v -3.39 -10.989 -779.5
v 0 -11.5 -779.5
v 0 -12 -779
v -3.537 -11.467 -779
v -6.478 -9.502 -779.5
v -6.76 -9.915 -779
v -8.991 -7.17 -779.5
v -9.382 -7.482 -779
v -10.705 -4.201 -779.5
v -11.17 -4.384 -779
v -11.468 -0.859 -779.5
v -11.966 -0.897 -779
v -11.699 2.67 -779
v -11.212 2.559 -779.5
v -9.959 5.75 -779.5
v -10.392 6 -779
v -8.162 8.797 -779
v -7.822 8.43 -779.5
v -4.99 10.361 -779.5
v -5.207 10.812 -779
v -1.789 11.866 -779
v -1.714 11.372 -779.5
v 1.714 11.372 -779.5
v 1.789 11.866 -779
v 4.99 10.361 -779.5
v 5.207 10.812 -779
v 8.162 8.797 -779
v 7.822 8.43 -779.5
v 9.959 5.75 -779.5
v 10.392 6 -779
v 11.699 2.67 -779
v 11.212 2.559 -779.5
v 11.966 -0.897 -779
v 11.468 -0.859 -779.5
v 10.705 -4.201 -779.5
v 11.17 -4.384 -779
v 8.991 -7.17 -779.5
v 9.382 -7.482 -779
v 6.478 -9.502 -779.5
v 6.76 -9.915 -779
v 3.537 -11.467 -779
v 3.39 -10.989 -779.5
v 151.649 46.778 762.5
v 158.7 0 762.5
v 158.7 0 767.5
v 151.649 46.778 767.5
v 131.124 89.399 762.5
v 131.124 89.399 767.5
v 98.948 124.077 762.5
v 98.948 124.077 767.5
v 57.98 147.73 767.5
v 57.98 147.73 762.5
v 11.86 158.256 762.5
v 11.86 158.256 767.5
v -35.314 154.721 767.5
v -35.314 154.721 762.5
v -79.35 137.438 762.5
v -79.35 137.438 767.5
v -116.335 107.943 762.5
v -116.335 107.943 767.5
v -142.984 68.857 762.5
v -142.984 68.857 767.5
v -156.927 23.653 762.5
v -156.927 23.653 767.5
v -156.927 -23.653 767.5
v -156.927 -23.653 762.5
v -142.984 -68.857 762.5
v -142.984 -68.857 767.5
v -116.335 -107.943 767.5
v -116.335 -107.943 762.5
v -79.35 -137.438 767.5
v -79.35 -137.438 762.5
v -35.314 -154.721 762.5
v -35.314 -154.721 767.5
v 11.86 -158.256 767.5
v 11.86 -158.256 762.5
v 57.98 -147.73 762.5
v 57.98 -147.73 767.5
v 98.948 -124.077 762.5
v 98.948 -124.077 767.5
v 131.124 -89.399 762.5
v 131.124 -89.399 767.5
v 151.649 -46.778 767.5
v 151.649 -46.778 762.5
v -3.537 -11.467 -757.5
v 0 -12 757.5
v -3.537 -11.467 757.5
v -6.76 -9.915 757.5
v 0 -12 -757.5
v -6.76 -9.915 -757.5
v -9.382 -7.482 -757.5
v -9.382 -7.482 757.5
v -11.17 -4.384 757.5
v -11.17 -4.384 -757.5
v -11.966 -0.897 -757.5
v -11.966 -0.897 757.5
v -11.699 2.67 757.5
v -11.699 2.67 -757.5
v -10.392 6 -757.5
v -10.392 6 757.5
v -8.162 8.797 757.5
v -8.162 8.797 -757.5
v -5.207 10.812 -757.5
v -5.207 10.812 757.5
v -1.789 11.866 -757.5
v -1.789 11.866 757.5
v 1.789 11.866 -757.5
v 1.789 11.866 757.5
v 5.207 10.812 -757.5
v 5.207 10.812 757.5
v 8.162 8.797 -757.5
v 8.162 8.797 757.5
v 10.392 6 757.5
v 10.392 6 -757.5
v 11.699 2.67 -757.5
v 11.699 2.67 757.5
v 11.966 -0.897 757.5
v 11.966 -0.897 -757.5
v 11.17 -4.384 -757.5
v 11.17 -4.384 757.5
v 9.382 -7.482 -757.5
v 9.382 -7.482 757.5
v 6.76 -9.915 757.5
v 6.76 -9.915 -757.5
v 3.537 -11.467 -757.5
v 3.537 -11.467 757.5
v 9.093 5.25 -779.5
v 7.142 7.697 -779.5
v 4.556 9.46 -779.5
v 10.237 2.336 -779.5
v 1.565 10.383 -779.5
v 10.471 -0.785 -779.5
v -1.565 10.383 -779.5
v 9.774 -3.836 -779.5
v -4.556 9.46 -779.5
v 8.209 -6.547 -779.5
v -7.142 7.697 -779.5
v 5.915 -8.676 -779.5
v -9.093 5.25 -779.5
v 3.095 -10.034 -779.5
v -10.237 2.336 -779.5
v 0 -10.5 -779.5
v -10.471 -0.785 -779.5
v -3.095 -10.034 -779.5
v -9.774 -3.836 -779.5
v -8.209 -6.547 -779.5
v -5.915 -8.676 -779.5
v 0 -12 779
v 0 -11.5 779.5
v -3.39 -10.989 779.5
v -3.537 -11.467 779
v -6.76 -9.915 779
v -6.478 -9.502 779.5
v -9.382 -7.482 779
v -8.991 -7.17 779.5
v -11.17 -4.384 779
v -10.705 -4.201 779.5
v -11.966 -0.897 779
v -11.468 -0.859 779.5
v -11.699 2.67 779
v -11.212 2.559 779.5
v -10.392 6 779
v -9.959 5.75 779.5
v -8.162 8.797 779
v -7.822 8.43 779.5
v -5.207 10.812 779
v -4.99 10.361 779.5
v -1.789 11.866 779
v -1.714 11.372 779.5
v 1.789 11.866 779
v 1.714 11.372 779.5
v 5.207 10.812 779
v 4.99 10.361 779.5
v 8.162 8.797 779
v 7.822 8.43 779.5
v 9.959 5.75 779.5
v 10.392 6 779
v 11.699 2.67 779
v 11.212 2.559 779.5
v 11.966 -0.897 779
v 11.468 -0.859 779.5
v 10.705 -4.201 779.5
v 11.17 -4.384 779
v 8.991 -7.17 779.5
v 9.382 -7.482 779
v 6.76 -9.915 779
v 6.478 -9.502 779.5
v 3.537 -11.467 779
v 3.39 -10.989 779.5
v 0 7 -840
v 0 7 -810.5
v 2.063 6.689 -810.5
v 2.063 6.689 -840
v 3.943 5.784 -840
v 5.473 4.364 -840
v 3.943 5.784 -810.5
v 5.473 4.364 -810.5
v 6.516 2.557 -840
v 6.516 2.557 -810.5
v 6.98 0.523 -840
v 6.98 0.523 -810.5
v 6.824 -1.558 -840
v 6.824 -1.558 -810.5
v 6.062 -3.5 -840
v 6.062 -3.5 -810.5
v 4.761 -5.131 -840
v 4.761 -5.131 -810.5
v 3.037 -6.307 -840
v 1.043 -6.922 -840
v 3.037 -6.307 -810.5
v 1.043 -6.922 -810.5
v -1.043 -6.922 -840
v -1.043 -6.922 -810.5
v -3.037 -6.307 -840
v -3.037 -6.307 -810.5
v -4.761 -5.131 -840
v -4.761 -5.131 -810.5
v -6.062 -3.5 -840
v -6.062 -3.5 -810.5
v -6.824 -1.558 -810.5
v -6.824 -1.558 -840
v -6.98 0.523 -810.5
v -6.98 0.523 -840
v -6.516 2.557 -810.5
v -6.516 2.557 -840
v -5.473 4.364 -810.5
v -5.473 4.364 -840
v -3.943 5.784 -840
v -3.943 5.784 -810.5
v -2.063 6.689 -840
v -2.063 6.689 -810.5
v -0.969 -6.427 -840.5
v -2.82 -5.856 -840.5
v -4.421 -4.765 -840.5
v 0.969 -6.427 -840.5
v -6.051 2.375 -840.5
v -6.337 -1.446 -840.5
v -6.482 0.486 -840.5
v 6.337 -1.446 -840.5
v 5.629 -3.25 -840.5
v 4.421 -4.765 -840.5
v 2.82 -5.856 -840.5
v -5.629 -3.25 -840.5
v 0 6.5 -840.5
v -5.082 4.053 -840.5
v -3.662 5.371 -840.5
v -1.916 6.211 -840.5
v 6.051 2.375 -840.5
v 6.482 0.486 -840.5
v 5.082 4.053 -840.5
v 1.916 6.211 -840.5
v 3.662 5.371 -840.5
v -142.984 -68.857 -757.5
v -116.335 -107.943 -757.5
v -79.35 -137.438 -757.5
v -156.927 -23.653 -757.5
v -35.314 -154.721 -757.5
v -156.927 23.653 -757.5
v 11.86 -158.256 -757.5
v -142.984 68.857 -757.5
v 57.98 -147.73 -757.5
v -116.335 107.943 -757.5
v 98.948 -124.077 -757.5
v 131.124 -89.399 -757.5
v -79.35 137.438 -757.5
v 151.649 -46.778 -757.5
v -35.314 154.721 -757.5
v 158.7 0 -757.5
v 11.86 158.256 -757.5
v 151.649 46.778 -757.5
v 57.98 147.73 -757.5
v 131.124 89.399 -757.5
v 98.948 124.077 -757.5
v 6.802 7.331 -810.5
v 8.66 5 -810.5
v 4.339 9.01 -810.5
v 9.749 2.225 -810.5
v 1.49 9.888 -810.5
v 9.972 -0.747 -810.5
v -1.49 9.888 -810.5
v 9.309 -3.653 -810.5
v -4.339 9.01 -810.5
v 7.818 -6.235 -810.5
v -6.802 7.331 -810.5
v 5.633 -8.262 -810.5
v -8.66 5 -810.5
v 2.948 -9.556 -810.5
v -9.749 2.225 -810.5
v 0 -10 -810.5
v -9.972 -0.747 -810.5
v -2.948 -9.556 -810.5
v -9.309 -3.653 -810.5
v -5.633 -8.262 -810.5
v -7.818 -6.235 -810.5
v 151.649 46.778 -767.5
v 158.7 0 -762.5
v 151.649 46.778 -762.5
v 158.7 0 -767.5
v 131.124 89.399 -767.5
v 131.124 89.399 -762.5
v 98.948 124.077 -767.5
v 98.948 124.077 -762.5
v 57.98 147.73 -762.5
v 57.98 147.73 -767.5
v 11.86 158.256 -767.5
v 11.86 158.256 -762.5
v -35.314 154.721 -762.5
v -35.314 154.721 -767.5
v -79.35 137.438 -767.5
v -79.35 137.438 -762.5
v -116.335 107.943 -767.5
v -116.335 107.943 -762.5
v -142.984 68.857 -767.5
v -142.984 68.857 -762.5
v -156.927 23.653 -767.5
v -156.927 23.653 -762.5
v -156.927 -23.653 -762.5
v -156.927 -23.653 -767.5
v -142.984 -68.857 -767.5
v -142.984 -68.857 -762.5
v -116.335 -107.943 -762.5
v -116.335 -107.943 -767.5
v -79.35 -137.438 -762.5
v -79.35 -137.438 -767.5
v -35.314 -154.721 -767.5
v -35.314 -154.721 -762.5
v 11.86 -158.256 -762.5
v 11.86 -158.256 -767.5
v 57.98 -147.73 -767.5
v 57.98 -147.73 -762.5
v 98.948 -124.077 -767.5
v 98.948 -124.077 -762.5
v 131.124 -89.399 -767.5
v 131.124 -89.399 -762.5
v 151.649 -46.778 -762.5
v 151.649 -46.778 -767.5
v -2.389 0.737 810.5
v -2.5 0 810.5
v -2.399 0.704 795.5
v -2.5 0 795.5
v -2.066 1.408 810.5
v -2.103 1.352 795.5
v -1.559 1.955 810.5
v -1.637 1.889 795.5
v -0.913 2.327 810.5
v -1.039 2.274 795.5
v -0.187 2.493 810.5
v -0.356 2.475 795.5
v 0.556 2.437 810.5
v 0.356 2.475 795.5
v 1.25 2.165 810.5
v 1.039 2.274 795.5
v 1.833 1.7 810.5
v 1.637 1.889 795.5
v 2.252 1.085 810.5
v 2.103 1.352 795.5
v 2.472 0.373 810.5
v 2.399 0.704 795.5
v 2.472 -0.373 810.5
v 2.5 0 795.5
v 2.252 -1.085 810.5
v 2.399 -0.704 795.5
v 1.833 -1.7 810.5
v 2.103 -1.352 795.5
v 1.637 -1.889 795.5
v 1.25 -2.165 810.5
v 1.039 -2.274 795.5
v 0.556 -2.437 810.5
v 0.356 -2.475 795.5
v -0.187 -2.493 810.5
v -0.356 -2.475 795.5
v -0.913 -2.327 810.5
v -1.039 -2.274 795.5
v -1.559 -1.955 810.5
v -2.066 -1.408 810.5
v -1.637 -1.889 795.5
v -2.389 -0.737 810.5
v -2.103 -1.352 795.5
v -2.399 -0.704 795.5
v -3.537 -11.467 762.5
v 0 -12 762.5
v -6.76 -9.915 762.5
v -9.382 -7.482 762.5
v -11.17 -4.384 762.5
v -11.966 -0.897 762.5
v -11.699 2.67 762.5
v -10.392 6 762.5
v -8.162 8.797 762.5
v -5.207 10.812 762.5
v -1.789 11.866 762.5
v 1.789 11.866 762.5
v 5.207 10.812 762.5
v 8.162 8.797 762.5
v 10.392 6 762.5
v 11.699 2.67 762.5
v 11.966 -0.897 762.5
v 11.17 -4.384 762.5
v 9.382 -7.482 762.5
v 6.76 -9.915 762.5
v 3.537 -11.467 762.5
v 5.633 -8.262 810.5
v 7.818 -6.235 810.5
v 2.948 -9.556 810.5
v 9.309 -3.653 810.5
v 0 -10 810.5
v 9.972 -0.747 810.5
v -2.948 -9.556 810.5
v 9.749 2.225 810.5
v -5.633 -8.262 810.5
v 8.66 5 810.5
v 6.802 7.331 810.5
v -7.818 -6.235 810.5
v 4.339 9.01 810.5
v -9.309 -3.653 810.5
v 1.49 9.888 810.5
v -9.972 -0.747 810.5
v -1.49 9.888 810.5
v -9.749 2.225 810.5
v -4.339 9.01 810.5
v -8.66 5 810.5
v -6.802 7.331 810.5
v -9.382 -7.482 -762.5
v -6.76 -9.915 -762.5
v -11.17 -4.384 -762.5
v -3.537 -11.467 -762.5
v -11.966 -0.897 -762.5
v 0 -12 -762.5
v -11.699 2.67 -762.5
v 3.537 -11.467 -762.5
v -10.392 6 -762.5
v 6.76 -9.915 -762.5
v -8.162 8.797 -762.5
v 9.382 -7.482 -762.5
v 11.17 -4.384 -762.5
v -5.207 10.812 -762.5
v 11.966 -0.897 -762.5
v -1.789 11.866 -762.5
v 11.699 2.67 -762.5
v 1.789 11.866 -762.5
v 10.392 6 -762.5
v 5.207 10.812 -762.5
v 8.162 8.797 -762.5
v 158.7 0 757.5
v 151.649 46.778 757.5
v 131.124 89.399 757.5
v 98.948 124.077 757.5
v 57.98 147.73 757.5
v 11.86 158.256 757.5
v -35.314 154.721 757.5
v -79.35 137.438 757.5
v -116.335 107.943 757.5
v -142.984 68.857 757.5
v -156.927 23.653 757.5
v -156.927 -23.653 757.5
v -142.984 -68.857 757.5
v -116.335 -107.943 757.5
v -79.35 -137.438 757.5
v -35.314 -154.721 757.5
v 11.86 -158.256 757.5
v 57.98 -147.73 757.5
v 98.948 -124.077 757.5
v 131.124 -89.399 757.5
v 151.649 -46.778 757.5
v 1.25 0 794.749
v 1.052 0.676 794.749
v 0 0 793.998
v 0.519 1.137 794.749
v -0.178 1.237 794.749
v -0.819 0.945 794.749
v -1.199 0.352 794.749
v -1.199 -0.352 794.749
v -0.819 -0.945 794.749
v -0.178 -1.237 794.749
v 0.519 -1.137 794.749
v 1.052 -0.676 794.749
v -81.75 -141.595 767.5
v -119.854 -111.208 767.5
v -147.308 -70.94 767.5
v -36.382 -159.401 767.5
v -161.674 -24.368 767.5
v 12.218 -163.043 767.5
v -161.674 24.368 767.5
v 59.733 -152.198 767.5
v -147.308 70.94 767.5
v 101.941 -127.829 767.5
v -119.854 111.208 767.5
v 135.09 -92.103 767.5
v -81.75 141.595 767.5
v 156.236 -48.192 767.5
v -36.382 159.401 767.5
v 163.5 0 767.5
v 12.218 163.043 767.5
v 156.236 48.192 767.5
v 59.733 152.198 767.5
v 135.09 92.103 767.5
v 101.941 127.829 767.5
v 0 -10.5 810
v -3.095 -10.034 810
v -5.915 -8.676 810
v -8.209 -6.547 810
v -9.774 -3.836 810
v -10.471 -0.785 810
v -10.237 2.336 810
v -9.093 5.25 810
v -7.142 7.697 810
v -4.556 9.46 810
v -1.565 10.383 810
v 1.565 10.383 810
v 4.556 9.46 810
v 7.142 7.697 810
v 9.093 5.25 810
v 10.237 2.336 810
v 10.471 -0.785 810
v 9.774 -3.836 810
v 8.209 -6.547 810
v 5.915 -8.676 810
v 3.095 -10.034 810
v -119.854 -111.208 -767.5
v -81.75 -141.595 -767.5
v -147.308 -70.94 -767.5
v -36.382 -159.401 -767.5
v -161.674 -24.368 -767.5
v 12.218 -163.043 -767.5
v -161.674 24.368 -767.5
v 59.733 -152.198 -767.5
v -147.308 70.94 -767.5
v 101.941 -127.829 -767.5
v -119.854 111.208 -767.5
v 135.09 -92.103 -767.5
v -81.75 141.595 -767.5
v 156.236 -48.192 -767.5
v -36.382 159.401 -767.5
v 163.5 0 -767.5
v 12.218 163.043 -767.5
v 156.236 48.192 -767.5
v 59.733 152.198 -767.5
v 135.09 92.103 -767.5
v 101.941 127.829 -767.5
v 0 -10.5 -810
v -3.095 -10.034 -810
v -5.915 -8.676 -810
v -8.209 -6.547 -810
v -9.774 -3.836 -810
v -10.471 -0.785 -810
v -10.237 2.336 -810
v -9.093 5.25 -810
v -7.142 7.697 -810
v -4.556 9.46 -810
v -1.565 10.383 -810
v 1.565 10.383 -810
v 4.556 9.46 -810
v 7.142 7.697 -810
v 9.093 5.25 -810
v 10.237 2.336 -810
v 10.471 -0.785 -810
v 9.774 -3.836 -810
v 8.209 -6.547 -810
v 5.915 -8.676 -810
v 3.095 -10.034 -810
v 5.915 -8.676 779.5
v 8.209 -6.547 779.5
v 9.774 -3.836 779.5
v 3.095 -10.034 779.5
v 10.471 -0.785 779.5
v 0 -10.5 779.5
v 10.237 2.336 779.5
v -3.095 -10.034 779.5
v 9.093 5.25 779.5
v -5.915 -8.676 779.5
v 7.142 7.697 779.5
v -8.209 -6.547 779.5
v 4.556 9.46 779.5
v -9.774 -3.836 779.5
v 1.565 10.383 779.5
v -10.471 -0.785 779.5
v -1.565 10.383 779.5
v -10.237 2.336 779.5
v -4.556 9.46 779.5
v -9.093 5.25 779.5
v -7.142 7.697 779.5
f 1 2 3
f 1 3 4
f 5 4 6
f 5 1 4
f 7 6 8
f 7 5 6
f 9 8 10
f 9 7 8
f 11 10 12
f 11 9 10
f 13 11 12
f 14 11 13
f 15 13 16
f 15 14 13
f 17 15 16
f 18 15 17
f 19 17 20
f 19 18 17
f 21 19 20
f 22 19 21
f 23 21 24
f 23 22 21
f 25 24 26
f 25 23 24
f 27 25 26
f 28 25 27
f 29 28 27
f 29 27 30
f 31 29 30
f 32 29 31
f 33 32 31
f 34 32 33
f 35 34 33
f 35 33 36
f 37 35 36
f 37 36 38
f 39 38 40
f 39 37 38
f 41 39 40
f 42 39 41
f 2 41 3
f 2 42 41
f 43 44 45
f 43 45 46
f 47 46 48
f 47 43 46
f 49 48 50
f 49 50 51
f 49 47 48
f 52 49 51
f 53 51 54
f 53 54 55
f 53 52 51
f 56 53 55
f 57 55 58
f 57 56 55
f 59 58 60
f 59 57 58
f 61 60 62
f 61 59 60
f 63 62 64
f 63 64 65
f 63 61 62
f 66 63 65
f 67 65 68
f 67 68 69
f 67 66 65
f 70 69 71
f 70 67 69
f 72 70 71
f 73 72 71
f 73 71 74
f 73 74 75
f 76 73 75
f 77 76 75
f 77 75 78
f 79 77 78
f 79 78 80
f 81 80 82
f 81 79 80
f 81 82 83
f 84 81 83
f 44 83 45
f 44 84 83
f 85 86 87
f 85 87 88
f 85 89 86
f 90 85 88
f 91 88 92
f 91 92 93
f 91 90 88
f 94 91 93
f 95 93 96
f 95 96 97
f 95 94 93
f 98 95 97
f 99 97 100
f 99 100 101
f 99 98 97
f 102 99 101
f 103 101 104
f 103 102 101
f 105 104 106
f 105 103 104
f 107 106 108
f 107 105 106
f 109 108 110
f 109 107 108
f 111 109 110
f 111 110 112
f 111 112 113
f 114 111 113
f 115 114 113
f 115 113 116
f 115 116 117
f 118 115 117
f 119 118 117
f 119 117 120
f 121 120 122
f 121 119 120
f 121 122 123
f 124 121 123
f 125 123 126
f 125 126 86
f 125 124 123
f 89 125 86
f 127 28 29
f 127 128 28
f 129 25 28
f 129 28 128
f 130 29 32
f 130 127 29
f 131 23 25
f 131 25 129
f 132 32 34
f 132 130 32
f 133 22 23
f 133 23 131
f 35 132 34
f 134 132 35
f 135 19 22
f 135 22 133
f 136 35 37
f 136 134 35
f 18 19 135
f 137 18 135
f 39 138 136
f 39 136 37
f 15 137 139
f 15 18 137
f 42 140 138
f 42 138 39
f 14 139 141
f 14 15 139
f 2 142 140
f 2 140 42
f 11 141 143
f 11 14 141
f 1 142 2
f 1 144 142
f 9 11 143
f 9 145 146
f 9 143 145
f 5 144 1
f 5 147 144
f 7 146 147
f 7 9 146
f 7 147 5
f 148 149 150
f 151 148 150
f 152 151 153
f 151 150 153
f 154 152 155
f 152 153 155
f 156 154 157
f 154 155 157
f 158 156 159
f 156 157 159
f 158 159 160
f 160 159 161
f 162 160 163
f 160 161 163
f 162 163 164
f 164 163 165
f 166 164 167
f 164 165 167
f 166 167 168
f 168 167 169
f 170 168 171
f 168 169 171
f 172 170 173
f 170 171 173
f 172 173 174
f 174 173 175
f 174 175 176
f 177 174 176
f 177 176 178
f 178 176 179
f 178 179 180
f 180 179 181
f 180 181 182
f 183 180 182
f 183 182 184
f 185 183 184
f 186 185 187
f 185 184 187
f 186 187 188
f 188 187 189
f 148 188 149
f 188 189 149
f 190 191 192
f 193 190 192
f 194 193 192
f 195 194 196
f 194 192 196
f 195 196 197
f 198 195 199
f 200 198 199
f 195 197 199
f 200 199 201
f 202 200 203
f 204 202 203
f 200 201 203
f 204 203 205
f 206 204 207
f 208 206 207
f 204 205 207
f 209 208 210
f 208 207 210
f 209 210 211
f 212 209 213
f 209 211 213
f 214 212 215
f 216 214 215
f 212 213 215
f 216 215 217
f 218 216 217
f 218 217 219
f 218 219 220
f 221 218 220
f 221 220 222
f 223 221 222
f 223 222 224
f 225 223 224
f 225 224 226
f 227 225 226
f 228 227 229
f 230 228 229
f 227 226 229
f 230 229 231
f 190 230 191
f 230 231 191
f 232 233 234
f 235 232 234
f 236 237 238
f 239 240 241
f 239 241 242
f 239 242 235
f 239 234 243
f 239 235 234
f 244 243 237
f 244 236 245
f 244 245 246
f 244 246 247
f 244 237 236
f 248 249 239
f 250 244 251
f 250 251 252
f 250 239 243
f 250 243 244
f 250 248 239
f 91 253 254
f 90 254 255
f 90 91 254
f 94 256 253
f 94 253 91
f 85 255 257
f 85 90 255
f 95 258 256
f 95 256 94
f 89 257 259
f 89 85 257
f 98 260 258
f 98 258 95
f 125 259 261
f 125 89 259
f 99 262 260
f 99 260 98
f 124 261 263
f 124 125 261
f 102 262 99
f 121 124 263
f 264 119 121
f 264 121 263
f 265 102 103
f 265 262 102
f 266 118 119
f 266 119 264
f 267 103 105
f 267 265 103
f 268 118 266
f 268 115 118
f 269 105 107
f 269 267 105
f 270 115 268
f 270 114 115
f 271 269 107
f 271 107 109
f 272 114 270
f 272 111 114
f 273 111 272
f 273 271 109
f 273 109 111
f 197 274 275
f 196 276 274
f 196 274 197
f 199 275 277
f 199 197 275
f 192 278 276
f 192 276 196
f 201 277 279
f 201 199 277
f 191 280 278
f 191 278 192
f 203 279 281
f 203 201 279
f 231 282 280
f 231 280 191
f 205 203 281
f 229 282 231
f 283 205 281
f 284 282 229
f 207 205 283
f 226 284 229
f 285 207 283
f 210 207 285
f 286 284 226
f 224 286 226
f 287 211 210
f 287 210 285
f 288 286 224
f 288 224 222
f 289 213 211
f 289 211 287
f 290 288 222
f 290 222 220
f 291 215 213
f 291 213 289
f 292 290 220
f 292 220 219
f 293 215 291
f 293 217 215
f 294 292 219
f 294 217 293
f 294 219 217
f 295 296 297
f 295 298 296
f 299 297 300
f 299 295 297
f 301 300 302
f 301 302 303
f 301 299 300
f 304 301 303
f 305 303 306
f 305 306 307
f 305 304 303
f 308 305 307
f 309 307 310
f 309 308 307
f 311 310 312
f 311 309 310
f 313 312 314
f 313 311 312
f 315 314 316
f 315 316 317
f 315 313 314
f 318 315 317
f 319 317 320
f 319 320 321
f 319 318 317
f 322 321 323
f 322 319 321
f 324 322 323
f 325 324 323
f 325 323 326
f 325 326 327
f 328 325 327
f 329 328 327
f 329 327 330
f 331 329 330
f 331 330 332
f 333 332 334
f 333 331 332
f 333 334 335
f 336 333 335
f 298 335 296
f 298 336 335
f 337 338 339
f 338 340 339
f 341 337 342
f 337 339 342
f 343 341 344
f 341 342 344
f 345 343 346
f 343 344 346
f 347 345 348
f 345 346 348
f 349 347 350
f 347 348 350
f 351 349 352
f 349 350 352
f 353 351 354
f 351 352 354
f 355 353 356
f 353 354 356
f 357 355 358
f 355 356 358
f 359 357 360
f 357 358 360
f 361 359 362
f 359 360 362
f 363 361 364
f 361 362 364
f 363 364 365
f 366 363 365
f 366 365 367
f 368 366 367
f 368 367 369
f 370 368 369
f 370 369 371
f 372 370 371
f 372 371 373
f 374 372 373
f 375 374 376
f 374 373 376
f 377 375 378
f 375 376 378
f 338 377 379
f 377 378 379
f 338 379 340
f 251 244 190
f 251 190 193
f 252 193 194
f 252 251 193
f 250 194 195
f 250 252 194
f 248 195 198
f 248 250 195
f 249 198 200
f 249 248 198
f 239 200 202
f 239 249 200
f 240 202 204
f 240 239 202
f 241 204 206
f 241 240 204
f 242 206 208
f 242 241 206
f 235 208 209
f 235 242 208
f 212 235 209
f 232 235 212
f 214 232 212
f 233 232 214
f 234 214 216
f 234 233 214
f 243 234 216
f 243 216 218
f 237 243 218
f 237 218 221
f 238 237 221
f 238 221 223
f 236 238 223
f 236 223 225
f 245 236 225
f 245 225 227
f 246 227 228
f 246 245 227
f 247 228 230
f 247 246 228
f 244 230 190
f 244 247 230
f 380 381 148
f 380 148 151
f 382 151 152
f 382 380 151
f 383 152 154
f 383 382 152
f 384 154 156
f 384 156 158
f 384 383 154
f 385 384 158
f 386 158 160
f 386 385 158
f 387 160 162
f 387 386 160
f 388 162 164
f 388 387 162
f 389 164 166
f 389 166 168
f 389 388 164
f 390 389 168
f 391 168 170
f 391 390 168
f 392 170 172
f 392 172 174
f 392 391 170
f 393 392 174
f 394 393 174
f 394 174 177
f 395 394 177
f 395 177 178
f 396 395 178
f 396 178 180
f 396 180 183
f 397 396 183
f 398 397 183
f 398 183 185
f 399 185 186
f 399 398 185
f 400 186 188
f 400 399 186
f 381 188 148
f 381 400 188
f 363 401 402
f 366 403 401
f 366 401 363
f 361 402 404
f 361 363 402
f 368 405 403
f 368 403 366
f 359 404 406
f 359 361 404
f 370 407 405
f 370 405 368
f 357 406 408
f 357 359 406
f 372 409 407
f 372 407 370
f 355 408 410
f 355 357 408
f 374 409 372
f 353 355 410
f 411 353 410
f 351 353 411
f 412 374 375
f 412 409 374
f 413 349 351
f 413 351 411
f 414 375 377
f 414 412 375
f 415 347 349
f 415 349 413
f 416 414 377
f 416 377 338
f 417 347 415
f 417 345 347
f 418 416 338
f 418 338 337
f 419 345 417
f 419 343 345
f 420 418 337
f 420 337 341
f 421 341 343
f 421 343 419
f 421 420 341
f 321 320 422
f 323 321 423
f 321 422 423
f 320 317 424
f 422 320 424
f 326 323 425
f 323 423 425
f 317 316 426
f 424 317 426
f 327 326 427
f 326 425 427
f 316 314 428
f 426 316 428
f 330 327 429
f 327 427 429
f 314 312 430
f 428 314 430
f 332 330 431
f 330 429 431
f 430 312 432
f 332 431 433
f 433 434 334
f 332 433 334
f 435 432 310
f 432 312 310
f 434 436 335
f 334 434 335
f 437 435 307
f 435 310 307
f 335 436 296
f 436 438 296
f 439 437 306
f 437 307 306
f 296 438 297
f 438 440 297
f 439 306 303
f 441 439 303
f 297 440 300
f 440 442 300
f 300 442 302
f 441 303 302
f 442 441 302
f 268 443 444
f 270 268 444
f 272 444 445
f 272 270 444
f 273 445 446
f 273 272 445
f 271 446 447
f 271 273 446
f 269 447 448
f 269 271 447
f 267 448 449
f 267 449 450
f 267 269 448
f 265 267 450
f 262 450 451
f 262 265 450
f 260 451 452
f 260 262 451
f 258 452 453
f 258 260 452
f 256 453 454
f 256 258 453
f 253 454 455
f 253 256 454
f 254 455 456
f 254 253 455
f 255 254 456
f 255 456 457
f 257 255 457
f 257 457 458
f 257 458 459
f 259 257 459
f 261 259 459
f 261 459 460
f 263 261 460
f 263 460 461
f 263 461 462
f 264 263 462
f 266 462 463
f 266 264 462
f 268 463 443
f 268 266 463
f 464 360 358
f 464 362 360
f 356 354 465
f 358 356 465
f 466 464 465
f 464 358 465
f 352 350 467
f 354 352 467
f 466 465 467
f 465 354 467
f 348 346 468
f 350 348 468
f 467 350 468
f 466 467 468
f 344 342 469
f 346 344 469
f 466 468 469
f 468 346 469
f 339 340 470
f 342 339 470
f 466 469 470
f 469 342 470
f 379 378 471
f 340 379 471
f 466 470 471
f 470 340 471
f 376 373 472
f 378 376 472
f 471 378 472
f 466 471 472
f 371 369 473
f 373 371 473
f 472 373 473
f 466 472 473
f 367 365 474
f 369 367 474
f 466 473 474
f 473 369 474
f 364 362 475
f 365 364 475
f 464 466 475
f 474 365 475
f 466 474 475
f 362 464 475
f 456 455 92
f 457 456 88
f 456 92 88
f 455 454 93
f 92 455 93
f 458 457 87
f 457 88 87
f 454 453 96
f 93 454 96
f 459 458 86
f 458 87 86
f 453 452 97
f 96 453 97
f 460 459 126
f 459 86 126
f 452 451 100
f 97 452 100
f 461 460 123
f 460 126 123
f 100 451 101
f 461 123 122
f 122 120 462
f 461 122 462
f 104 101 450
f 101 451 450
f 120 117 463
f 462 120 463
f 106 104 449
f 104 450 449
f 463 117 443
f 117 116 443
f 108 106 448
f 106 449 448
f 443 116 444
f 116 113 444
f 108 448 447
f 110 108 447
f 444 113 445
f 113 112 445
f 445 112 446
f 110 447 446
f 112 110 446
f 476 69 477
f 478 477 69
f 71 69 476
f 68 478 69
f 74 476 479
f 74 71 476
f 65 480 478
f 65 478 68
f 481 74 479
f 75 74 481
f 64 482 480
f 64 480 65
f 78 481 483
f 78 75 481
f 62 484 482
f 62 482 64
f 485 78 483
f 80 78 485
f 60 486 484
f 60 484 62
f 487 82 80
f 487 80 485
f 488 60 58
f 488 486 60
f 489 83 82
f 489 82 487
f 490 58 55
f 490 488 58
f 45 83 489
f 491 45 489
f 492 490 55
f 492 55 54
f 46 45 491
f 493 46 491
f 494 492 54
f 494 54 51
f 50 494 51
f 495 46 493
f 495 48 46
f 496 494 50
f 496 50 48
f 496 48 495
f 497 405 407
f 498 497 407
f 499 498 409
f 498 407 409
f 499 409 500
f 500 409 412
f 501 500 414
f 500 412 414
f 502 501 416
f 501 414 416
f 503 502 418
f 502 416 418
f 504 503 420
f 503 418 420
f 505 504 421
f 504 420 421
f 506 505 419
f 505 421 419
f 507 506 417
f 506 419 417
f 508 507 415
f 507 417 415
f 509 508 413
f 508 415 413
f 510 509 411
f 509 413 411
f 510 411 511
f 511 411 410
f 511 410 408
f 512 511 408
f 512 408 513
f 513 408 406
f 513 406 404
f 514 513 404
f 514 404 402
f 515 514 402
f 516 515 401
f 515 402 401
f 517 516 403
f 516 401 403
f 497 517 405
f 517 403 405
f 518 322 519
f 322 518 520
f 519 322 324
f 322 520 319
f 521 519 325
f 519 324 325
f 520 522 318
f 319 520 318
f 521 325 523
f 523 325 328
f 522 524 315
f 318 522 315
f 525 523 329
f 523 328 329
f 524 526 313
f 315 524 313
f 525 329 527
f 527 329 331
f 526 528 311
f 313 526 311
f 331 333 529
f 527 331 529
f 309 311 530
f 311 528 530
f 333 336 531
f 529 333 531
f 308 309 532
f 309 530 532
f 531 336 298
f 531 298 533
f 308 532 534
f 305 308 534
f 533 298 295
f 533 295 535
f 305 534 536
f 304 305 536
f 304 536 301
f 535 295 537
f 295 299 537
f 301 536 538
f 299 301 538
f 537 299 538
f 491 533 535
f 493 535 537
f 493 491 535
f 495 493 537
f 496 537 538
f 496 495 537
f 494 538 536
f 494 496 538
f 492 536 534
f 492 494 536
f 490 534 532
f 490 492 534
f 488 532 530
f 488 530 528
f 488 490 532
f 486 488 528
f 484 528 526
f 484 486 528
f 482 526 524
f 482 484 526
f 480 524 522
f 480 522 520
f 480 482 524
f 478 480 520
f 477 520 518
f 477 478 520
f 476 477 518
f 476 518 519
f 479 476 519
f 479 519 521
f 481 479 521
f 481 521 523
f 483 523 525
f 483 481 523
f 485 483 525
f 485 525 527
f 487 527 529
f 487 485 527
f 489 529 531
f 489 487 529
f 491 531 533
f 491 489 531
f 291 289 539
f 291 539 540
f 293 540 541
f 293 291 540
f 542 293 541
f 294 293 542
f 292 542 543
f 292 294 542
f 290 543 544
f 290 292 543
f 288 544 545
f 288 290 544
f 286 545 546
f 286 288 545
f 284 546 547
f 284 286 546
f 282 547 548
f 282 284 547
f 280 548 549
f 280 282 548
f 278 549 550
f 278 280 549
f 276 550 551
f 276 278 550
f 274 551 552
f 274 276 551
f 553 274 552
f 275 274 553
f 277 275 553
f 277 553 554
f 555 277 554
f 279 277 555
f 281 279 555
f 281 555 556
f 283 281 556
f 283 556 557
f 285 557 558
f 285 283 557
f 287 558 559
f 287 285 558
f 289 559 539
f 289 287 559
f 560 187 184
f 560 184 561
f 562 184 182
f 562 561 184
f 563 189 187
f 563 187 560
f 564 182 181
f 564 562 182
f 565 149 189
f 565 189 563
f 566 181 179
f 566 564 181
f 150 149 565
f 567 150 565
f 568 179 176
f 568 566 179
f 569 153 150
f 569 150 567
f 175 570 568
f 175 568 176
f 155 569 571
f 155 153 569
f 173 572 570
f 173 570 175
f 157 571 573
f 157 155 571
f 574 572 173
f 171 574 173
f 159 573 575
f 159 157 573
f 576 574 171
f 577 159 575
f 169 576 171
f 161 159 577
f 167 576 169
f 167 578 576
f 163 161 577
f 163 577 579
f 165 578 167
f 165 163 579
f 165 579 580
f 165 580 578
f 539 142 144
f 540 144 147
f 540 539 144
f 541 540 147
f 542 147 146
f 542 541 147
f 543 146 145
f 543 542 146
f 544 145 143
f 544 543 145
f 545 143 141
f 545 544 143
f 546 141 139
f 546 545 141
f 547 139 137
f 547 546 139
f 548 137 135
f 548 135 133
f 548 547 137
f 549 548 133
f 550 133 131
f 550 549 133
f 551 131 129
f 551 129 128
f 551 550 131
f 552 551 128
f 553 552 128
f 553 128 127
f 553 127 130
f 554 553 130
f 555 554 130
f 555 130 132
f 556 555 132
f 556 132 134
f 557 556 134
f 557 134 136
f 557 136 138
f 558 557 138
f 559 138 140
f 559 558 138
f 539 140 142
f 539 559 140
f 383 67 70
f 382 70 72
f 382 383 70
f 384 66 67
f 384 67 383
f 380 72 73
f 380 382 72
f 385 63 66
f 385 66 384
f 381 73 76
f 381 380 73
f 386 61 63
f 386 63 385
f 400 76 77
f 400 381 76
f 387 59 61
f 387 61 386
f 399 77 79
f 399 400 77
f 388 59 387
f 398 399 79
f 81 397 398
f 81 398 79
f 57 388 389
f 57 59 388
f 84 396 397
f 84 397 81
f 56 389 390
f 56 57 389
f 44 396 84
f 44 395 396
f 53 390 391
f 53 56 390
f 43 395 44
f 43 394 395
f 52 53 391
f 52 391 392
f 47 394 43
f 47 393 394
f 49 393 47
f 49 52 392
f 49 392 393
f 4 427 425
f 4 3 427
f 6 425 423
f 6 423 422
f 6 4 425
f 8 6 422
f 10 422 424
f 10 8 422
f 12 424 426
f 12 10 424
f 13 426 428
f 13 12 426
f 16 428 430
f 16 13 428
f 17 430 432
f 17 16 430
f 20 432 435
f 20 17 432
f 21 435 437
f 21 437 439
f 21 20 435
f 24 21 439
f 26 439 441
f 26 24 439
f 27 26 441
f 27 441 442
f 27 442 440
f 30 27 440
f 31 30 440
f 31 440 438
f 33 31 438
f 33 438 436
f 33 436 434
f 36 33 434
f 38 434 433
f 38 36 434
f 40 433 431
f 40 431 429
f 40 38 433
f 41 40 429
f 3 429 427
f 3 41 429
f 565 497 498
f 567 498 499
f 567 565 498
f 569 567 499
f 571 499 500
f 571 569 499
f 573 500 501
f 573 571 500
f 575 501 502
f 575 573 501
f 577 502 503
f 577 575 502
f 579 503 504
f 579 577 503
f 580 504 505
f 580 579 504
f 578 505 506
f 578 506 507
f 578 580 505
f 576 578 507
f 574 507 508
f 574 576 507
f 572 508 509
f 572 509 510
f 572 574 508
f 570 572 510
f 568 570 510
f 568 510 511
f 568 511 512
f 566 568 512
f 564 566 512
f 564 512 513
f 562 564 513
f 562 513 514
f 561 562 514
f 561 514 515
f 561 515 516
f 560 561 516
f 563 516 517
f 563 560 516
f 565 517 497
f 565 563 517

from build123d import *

# Parameters (mm, degrees)
SKETCH1_R             = 163.5
SKETCH1_R_2           = 158.7
BOSS_EXTRUDE1_DEPTH   = 767.5
BOSS_EXTRUDE2_START   = -10
SKETCH2_R             = 158.7
BOSS_EXTRUDE2_DEPTH   = 5
CHAMFER1_SIZE         = 0.5
M6_TAPPED_HOLE1_D     = 5
M6_TAPPED_HOLE1_DEPTH = 15
M6_TAPPED_HOLE1_TIP   = 1.502151548
SKETCH8_R             = 7
BOSS_EXTRUDE3_DEPTH   = 30
CHAMFER2_SIZE         = 0.5


with BuildPart() as part:
    # Sketch1 → Boss-Extrude1 (new, symmetric)
    with BuildSketch(Plane.XY):
        Circle(SKETCH1_R)
        Circle(SKETCH1_R_2, mode=Mode.SUBTRACT)
    extrude(amount=BOSS_EXTRUDE1_DEPTH, both=True)

    # Sketch2 → Boss-Extrude2 (add)
    with BuildSketch(Plane.XY.offset(767.5).offset(BOSS_EXTRUDE2_START)):
        Circle(SKETCH2_R)
    boss_extrude2 = extrude(amount=BOSS_EXTRUDE2_DEPTH)

    # Sketch5 → Revolve1 (revolve)
    with BuildSketch(Plane(origin=(0, 0, 0), x_dir=(0, 0, -1), z_dir=(1, 0, 0)), mode=Mode.PRIVATE) as revolve1_sk:
        Polygon((-779.5, 12), (779.5, 12), (779.5, 10.5), (810.5, 10.5), (810.5, 0), (-810.5, 0), (-810.5, 10.5), (-779.5, 10.5), align=None)
    revolve(revolve1_sk.sketch.rotate(Axis((0, 0, -810.5), (0, 0, -1)), 180), axis=Axis((0, 0, -810.5), (0, 0, -1)))

    # Chamfer1
    chamfer1_edges = [part.edges().sort_by_distance(p)[0] for p in [
        (0, 12, -779.5),
        (0, 12, 779.5),
        (0, 10.5, -810.5),
        (0, 10.5, 810.5),
    ]]
    chamfer(chamfer1_edges, length=CHAMFER1_SIZE)

    # M6 Tapped Hole1
    with Locations(Plane.XY.offset(810.5)):
        with Locations((0, 0)):
            Hole(M6_TAPPED_HOLE1_D / 2, depth=M6_TAPPED_HOLE1_DEPTH)
            with Locations((0, 0, -(M6_TAPPED_HOLE1_DEPTH + M6_TAPPED_HOLE1_TIP / 2))):  # 118° drill point
                Cone(0, M6_TAPPED_HOLE1_D / 2, M6_TAPPED_HOLE1_TIP, mode=Mode.SUBTRACT)

    # Mirror3: Boss-Extrude2 across plane
    add(boss_extrude2.mirror(Plane.XY))

    # Sketch8 → Boss-Extrude3 (add)
    with BuildSketch(Plane(origin=(0, 0, -810.5), x_dir=(-1, 0, 0), z_dir=(0, 0, -1))):
        with Locations(Location((0, 0, 0), (0, 0, 90))):
            Circle(SKETCH8_R)
    extrude(amount=BOSS_EXTRUDE3_DEPTH)

    # Chamfer2
    chamfer2_edges = [part.edges().sort_by_distance(p)[0] for p in [
        (0, -7, -840.5),
    ]]
    chamfer(chamfer2_edges, length=CHAMFER2_SIZE)


solid = part.part
